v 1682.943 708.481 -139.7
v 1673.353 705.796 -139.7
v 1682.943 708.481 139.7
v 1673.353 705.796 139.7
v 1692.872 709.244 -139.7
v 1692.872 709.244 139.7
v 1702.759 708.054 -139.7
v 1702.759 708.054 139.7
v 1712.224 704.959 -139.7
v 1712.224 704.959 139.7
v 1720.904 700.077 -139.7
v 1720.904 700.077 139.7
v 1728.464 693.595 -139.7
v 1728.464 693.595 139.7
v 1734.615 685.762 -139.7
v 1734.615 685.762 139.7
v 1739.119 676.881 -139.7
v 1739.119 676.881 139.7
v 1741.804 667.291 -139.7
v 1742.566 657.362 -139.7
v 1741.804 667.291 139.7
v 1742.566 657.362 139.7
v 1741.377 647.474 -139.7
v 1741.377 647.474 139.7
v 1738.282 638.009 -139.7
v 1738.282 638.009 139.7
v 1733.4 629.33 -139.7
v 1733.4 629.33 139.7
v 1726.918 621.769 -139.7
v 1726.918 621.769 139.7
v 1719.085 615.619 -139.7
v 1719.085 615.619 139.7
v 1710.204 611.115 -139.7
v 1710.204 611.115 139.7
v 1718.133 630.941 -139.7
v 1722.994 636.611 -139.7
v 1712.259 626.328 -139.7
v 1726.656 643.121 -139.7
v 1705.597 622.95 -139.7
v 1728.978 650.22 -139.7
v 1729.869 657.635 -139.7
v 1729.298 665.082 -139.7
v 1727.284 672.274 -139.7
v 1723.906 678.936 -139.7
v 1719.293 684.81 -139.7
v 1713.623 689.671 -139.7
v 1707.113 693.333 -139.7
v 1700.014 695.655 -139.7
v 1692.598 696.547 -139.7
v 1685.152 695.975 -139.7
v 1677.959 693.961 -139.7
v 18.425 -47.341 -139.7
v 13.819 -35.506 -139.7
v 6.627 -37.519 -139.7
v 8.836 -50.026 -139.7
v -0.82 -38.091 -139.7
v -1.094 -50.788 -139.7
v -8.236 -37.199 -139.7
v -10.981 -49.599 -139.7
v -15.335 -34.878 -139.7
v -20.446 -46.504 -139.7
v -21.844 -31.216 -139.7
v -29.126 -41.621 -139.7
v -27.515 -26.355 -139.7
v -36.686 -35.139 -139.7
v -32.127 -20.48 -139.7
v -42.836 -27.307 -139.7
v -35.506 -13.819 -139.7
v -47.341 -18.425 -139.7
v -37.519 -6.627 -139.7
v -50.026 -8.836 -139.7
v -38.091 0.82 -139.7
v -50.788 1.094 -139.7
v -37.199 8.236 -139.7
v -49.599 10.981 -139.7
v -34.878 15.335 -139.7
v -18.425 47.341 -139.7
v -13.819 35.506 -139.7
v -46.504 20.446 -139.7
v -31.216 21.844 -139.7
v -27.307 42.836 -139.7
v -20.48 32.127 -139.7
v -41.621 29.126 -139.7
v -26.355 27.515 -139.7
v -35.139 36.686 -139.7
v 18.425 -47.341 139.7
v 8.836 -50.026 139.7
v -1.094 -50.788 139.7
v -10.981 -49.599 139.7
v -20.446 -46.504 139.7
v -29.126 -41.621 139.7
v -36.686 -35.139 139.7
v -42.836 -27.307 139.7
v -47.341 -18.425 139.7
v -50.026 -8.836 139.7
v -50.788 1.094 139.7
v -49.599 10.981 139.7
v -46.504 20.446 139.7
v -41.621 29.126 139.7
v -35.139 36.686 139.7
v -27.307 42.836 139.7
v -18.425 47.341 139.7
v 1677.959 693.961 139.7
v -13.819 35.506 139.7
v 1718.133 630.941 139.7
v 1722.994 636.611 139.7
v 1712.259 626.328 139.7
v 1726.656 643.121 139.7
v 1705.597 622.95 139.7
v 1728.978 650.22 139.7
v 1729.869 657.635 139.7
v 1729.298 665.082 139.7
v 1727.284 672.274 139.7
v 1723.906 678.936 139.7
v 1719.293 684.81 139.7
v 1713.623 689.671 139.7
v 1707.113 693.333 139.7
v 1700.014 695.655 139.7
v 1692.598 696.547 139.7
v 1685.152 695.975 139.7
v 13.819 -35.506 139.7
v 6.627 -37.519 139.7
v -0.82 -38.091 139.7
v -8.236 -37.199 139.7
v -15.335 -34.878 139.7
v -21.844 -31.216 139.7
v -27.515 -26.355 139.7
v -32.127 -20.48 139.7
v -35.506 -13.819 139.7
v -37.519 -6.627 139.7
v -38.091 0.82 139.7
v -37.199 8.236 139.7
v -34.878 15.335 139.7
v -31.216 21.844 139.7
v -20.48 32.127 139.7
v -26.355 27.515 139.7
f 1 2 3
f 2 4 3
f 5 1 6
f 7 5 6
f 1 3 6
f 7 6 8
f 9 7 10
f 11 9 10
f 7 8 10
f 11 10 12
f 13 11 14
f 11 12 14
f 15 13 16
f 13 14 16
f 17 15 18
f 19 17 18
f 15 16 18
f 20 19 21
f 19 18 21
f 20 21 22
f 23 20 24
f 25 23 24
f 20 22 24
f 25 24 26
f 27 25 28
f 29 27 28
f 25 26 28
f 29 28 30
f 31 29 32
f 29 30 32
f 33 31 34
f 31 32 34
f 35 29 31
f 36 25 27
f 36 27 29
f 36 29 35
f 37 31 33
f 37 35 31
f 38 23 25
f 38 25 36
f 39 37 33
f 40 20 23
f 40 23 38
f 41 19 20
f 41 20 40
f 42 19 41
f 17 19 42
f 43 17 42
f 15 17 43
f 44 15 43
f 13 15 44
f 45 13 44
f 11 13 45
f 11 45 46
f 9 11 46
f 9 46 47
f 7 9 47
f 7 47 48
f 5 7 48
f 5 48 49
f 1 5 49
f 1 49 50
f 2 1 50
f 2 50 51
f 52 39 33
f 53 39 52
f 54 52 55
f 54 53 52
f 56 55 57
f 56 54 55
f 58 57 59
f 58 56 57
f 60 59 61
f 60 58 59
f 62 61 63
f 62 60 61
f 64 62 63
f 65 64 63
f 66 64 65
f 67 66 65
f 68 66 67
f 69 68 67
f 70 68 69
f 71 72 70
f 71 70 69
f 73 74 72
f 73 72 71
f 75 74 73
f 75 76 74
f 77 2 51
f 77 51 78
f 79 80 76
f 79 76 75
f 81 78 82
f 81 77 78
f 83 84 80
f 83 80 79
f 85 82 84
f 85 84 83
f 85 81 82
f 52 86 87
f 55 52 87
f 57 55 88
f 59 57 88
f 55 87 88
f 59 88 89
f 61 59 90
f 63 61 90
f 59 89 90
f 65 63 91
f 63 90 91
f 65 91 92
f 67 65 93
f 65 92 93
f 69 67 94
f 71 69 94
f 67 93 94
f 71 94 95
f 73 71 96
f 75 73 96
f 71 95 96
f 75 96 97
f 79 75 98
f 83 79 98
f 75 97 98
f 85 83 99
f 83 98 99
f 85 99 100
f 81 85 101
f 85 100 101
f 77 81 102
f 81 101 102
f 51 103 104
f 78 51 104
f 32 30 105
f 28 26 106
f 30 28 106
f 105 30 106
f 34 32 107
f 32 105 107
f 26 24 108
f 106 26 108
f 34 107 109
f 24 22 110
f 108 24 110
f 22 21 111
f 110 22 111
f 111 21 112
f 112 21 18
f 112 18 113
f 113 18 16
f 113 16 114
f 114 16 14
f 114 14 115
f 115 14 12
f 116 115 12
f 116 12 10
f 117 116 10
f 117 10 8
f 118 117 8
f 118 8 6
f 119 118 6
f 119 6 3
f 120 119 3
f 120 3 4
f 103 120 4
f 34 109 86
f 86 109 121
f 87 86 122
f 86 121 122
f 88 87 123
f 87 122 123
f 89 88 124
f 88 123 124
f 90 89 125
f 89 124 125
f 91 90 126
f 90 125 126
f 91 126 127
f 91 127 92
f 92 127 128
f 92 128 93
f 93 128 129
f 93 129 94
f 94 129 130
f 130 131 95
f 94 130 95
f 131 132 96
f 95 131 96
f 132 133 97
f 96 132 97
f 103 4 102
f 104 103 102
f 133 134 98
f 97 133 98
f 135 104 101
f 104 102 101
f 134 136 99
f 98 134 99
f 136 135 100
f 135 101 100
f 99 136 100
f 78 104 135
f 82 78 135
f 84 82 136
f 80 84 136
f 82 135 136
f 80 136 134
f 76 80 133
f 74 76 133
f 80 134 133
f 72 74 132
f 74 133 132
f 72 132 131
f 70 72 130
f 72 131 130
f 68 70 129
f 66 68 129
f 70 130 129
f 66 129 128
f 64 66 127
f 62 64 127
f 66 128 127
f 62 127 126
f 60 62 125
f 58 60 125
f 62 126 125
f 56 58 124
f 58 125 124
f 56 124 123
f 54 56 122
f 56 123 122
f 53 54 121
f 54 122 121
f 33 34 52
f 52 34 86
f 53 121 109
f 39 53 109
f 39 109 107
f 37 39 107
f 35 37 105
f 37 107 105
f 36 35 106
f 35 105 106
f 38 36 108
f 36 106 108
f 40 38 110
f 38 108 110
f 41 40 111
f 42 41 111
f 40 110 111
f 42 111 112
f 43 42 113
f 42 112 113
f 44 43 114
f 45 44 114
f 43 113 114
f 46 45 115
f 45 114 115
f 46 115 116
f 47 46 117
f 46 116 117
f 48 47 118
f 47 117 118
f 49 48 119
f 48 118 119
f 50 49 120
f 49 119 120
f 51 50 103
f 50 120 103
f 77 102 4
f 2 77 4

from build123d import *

# Parameters (mm, degrees)
BOSS_EXTRUDE1_DEPTH = 139.7
CUT_EXTRUDE1_DEPTH  = 1903.021697166


with BuildPart() as part:
    # Sketch2 → Boss-Extrude1 (new, symmetric)
    with BuildSketch(Plane.XY):
        with BuildLine():
            Line((-18.425433745, 47.340715999), (1673.352830516, 705.796078626))
            ThreePointArc((1673.352830516, 705.796078626), (1739.11898026, 676.880796373), (1710.203698007, 611.114646628))
            Line((1710.203698007, 611.114646628), (18.425433745, -47.340715999))
            ThreePointArc((18.425433745, -47.340715999), (-47.340715999, -18.425433745), (-18.425433745, 47.340715999))
        make_face()
    extrude(amount=BOSS_EXTRUDE1_DEPTH, both=True)

    # Sketch7 → Cut-Extrude1 (cut, through all)
    with BuildSketch(Plane.XY.offset(139.7)):
        with BuildLine():
            Line((13.819075309, -35.505536999), (1705.59733957, 622.949825628))
            ThreePointArc((1705.59733957, 622.949825628), (1727.283801261, 672.274437937), (1677.959188952, 693.960899627))
            Line((1677.959188952, 693.960899627), (-13.819075309, 35.505536999))
            ThreePointArc((-13.819075309, 35.505536999), (-35.505536999, -13.819075309), (13.819075309, -35.505536999))
        make_face()
    extrude(amount=-CUT_EXTRUDE1_DEPTH, mode=Mode.SUBTRACT)


solid = part.part
